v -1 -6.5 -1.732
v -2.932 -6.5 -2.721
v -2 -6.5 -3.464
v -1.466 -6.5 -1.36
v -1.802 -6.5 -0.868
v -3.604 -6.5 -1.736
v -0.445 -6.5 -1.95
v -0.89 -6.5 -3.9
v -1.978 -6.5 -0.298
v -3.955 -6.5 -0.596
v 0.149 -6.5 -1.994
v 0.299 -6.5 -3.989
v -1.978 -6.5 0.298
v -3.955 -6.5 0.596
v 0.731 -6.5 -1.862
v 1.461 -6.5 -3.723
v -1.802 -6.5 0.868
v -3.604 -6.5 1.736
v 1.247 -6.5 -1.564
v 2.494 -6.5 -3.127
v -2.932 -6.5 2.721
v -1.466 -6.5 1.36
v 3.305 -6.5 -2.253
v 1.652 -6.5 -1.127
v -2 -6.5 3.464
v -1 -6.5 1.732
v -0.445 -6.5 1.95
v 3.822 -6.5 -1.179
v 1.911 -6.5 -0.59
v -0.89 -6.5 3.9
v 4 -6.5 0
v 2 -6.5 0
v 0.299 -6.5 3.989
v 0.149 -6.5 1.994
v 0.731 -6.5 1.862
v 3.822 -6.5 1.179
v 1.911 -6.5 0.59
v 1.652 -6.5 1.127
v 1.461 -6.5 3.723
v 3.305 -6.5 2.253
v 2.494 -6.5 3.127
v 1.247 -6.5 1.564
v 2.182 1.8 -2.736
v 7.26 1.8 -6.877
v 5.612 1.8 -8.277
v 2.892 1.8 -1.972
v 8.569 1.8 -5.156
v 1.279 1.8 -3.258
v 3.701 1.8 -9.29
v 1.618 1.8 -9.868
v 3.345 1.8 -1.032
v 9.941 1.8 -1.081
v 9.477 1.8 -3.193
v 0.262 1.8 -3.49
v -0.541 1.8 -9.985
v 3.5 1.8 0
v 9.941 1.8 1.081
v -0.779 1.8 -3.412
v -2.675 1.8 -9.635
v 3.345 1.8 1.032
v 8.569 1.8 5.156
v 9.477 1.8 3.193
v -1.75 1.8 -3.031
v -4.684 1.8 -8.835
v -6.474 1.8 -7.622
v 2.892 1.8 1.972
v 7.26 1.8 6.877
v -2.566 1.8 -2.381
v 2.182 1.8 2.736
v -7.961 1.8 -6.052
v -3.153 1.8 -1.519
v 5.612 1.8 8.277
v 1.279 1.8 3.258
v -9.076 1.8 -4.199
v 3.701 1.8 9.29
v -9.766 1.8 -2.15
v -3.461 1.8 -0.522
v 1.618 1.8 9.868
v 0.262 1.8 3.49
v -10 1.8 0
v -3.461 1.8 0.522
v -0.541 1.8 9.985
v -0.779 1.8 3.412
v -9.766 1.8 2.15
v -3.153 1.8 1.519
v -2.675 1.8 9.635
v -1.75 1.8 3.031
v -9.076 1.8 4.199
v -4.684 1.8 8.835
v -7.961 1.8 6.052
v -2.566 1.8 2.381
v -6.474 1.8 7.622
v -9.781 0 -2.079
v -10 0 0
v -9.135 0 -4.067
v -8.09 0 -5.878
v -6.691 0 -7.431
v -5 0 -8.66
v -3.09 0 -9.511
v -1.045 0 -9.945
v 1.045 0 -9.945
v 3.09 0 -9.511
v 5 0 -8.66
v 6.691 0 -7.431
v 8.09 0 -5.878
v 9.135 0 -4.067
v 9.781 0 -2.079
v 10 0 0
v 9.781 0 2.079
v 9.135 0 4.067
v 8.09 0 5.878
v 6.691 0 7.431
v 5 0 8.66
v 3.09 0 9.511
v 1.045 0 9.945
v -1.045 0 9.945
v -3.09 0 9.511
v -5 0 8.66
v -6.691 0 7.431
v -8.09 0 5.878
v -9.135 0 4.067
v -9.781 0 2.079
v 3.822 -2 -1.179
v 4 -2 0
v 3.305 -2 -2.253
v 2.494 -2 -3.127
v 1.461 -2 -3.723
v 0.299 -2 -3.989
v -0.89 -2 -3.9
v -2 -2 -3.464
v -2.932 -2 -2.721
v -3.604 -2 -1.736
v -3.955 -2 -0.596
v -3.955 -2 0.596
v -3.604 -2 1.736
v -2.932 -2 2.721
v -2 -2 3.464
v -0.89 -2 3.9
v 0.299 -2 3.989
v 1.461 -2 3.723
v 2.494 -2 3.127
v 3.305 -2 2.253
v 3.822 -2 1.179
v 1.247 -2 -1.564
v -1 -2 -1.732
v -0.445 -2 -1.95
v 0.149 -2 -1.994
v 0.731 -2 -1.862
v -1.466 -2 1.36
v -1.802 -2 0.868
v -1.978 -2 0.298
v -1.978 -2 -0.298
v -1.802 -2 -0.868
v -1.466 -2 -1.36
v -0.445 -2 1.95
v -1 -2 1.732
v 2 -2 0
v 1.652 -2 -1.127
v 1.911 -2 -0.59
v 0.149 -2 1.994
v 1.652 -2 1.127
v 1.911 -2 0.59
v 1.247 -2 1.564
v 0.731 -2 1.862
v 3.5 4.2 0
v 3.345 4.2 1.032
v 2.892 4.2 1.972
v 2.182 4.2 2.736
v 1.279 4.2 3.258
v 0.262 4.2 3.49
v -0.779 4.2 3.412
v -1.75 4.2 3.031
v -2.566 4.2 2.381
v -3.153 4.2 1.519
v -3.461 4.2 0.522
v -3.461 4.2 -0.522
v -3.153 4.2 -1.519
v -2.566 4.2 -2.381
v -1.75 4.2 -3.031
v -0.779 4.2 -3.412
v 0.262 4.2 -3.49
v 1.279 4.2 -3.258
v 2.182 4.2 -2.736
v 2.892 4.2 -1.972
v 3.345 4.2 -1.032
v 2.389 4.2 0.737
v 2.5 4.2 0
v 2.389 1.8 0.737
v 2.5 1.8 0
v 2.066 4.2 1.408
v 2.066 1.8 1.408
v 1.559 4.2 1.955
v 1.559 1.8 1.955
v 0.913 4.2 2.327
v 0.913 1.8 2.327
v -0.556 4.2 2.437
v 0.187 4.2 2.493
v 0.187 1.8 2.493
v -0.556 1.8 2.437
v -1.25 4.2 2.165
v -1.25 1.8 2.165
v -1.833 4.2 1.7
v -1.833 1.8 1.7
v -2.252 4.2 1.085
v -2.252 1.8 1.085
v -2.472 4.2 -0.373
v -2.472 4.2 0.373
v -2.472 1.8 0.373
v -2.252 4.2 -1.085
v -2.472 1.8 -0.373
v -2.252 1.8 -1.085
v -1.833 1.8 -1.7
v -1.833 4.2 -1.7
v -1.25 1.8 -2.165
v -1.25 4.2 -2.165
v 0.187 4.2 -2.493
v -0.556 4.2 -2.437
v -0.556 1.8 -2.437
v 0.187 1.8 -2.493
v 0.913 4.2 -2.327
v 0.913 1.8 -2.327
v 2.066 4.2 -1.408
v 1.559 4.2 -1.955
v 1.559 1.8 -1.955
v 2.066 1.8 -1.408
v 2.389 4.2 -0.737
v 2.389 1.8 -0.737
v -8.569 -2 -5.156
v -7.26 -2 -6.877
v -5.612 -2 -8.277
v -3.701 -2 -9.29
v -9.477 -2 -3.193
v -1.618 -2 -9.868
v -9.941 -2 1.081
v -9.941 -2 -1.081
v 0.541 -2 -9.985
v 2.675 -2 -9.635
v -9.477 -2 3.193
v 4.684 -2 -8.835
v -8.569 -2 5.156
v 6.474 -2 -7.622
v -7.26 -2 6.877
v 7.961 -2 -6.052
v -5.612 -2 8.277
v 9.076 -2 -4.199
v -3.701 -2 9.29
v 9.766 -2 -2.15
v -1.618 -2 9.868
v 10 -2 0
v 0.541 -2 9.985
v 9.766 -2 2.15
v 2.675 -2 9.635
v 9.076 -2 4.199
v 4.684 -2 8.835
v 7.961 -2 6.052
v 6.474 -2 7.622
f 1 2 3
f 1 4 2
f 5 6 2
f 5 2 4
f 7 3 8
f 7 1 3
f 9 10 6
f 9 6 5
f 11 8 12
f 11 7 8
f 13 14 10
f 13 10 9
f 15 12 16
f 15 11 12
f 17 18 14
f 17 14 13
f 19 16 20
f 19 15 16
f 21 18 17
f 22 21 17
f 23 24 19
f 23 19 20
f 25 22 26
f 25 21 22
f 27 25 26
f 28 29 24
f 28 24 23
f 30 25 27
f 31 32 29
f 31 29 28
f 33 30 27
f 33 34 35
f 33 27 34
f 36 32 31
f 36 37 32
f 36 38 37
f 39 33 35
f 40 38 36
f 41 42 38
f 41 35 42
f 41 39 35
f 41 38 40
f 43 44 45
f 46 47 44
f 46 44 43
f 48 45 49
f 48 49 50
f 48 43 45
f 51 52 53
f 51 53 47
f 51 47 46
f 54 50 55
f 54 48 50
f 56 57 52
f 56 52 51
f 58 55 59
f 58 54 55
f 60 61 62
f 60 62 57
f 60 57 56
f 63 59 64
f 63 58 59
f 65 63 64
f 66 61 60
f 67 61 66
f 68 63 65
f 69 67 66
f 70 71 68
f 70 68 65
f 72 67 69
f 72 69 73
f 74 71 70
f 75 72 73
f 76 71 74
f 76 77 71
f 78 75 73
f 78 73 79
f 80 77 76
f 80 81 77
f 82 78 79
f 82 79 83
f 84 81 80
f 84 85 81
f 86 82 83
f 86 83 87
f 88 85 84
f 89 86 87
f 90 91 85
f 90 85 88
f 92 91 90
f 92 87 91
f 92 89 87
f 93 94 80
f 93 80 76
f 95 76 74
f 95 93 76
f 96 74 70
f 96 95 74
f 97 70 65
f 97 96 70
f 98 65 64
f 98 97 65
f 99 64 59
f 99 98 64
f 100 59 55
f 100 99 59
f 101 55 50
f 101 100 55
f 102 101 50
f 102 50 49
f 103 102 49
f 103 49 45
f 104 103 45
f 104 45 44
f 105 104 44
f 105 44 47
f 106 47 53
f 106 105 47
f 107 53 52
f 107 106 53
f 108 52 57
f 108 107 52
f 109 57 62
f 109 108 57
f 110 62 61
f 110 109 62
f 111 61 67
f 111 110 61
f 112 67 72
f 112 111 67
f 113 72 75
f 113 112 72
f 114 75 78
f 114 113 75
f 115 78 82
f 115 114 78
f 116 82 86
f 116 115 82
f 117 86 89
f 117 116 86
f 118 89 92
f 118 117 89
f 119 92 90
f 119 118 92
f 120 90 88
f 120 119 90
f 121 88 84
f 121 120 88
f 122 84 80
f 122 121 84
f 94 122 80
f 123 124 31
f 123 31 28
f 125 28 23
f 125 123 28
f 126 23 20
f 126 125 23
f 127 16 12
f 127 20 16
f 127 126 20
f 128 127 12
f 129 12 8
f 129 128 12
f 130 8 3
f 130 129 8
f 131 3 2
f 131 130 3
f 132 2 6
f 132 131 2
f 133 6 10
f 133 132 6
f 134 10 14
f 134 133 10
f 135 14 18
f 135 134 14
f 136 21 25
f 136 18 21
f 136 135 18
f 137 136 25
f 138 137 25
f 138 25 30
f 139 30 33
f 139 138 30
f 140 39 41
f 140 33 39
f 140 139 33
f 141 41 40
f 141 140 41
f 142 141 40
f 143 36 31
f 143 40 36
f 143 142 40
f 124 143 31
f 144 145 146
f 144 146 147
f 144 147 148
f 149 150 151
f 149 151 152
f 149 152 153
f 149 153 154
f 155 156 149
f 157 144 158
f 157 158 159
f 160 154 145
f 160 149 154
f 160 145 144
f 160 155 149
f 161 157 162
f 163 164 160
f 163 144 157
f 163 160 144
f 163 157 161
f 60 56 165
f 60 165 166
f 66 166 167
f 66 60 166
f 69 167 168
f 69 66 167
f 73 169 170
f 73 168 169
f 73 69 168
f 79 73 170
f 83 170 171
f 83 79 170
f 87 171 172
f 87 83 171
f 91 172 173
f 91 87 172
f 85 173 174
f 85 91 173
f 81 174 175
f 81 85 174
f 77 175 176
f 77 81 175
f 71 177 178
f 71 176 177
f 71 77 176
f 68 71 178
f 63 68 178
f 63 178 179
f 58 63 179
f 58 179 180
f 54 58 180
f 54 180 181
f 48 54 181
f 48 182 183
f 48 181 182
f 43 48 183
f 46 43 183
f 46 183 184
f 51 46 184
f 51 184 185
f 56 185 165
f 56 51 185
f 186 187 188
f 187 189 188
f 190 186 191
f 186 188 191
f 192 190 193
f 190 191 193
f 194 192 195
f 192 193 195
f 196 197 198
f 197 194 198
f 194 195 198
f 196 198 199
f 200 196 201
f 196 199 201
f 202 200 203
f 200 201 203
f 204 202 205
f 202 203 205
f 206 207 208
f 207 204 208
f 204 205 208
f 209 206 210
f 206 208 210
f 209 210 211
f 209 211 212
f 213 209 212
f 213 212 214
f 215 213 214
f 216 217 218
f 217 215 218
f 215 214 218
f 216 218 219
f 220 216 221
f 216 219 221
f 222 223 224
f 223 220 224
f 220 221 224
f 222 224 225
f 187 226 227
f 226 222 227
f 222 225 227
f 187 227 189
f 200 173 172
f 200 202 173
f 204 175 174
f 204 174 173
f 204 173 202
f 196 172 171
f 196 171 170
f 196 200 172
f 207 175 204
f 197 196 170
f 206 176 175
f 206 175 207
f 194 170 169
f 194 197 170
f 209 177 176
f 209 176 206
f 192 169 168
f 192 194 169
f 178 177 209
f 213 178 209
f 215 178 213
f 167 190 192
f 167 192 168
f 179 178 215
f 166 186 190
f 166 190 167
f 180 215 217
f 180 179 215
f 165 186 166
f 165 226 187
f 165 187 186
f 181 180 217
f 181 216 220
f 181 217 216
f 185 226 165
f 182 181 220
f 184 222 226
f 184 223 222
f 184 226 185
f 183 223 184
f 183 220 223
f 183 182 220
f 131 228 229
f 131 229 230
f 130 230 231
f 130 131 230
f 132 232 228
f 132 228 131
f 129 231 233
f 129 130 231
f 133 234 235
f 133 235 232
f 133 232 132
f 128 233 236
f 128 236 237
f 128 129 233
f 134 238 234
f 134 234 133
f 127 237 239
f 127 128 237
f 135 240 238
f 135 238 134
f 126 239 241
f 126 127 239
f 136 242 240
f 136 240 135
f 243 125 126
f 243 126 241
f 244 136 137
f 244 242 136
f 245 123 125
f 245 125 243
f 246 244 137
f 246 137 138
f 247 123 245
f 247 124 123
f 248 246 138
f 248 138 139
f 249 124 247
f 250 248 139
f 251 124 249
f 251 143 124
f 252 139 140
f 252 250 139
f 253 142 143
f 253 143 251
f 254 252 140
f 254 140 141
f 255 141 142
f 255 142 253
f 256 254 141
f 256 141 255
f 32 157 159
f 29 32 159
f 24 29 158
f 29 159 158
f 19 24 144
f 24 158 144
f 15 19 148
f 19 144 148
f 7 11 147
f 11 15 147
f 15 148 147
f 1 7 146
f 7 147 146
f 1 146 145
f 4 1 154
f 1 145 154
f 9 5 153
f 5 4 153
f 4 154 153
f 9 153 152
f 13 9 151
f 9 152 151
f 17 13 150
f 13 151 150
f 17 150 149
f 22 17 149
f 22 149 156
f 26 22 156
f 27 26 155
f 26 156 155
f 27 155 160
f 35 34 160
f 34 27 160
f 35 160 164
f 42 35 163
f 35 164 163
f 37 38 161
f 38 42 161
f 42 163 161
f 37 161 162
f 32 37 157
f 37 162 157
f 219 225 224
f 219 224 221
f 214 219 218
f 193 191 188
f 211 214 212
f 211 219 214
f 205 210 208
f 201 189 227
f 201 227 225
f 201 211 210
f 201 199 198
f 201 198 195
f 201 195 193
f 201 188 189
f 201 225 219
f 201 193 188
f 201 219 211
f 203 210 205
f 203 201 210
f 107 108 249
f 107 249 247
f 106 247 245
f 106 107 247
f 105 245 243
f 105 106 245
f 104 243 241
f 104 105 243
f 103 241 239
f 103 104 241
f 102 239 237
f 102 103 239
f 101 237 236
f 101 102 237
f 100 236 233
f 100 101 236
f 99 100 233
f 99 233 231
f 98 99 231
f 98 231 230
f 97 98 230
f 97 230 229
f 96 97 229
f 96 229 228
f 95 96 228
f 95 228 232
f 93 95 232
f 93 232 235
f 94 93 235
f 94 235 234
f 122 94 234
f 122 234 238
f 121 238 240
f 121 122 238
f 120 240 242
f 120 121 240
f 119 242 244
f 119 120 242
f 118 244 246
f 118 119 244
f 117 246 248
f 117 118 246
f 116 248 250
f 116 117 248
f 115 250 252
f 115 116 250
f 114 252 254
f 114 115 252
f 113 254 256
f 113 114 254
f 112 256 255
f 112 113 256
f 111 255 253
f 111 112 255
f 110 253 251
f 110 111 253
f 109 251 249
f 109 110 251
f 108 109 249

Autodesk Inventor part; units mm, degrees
ref_plane "YZ Plane" through (0, 0, 0) normal (1, 0, 0) x (0, 1, 0)
ref_plane "XZ Plane" through (0, 0, 0) normal (0, 1, 0) x (-1, 0, 0)
ref_plane "XY Plane" through (0, 0, 0) normal (0, 0, 1) x (1, 0, 0)
sketch "Sketch1" plane through (0, 0, 0) normal (0, 1, 0) x (-1, 0, 0)
  circle A0 centre (0, 0) radius 10
  dimension "d0" = 20
extrude "Extrusion1" add sketch "Sketch1" along normal blind 1.8
sketch "Sketch3" plane through (0, 1.8, 0) normal (0, 1, 0) x (1, 0, 0)
  circle A0 centre (0, 0) radius 10 projected
  circle A1 centre (0, 0) radius 3.5
  circle A2 centre (0, 0) radius 2.5
  dimension "d3" = 7
  dimension "d4" = 5
extrude "Extrusion2" add sketch "Sketch3" along normal blind 2.4 contours A1
sketch "Sketch4" plane through (0, 0, 0) normal (0, -1, 0) x (1, 0, 0)
  circle A0 centre (0, 0) radius 10 projected
  line L0 (0, 0) -> (6.3, 0)
  circle A1 centre (6.3, 0) radius 1.5
  dimension "d7" = 6.3
  dimension "d8" = 3
extrude "Extrusion3" cut sketch "Sketch4" against normal blind 2.4 contours A1
sketch "Sketch5" plane through (0, 0, 0) normal (0, -1, 0) x (1, 0, 0)
  circle A0 centre (0, 0) radius 10 projected
  line L0 (0, 0) -> (-6.3, 0)
  circle A1 centre (-6.3, 0) radius 1.5
  dimension "d11" = 6.3
  dimension "d12" = 3
extrude "Extrusion4" cut sketch "Sketch5" against normal blind 2 contours A1
sketch "Sketch6" plane through (0, 0, 0) normal (0, -1, 0) x (1, 0, 0)
  circle A0 centre (-6.3, 0) radius 1.5 projected
  circle A1 centre (6.3, 0) radius 1.5 projected
extrude "Extrusion5" add sketch "Sketch6" against normal blind 1.8
sketch "Sketch7" plane through (0, 0, 0) normal (0, -1, 0) x (1, 0, 0)
  circle A0 centre (0, 0) radius 10 projected
extrude "Extrusion6" add sketch "Sketch7" along normal blind 2
sketch "Sketch8" plane through (0, -2, 0) normal (0, -1, 0) x (1, 0, 0)
  circle A0 centre (0, 0) radius 10 projected
  circle A1 centre (0, 0) radius 4
  circle A2 centre (0, 0) radius 2
  dimension "d19" = 8
  dimension "d20" = 4
extrude "Extrusion7" add sketch "Sketch8" along normal blind 4.5 contours A1
properties part number "otaceni_packy_microservo"
